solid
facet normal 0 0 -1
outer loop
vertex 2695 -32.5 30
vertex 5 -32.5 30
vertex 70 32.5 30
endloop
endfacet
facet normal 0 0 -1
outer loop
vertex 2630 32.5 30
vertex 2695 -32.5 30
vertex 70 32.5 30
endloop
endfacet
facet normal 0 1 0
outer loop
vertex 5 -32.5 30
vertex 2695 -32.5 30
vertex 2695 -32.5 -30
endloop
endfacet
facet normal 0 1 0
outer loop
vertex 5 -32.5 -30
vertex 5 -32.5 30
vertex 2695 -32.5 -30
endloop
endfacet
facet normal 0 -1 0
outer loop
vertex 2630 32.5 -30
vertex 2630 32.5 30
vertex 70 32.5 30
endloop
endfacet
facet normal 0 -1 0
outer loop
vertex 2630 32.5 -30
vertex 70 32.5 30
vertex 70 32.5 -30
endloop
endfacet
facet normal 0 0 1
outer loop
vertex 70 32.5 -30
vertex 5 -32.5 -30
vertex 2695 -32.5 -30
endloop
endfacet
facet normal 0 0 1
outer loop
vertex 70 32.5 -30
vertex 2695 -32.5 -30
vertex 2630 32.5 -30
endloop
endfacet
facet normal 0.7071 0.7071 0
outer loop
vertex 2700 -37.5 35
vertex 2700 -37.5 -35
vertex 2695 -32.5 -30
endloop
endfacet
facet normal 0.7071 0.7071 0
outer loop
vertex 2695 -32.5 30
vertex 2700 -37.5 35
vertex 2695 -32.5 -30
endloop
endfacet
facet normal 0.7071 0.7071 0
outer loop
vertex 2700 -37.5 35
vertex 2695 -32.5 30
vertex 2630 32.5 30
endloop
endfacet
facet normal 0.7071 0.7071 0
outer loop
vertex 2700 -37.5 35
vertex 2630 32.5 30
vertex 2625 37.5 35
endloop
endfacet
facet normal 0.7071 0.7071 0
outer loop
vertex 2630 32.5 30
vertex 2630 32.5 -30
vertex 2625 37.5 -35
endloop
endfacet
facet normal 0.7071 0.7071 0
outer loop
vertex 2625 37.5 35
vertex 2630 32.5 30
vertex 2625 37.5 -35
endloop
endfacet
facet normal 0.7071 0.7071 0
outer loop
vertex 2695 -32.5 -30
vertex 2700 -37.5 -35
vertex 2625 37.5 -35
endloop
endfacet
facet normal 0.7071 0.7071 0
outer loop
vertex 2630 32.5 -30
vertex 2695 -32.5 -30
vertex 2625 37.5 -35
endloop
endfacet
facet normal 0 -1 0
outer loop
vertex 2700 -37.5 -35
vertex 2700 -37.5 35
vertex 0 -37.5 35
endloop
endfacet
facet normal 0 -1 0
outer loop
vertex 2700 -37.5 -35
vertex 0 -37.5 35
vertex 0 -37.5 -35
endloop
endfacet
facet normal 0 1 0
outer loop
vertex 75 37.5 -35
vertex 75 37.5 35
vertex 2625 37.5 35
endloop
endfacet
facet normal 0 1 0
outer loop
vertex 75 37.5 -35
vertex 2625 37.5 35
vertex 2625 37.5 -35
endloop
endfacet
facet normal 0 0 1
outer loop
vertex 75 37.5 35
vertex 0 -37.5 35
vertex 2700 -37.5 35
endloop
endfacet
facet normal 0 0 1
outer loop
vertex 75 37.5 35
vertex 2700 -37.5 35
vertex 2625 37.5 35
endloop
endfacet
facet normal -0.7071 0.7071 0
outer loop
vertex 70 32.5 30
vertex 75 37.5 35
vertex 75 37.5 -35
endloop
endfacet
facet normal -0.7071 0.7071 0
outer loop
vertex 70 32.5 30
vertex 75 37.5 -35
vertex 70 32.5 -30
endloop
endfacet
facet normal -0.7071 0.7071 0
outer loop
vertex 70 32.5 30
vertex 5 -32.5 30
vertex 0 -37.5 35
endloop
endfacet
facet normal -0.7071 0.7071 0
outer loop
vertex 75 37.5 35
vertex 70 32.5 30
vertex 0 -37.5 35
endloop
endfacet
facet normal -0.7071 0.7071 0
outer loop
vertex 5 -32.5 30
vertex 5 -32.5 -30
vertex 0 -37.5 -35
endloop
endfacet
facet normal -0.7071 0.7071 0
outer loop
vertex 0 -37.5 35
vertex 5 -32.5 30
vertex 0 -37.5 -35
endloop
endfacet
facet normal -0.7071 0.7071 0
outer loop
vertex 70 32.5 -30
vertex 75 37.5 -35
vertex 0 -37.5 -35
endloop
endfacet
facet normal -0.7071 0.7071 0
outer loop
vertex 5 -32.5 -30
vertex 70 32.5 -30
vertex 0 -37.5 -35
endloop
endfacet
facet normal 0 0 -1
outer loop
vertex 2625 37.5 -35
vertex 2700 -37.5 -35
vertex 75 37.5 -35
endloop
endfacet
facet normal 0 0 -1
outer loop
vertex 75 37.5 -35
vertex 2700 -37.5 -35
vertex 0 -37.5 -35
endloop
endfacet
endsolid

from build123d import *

# Parameters (mm, degrees)
SKETCH_2_W          = 70
SKETCH_2_H          = 75
SKETCH_2_W_2        = 60
SKETCH_2_H_2        = 65
EXTRUDE_1_DEPTH     = 2700
SKETCH_3_OUTSIDE_W  = 3242.39
SKETCH_3_OUTSIDE_H  = 617.39
CUT_EXTRUDE_1_DEPTH = 71


with BuildPart() as part:
    # Эскиз2 → Вытянуть-Тонкостенный1 (new body)
    with BuildSketch(Plane(origin=(0, 0, 0), x_dir=(0, 0, -1), z_dir=(1, 0, 0))):
        Rectangle(SKETCH_2_W, SKETCH_2_H)
        Rectangle(SKETCH_2_W_2, SKETCH_2_H_2, mode=Mode.SUBTRACT)
    extrude(amount=EXTRUDE_1_DEPTH)

    # Эскиз3 outside → Вырез-Вытянуть1 (cut, through all)
    with BuildSketch(Plane(origin=(0, 0, -35), x_dir=(-1, 0, 0), z_dir=(0, 0, -1))):
        with Locations((-1350, 0)):
            Rectangle(SKETCH_3_OUTSIDE_W, SKETCH_3_OUTSIDE_H)
        Polygon((-2700, -37.5), (-2625, 37.5), (-75, 37.5), (0, -37.5), align=None, mode=Mode.SUBTRACT)
    extrude(amount=-CUT_EXTRUDE_1_DEPTH, mode=Mode.SUBTRACT)


solid = part.part
